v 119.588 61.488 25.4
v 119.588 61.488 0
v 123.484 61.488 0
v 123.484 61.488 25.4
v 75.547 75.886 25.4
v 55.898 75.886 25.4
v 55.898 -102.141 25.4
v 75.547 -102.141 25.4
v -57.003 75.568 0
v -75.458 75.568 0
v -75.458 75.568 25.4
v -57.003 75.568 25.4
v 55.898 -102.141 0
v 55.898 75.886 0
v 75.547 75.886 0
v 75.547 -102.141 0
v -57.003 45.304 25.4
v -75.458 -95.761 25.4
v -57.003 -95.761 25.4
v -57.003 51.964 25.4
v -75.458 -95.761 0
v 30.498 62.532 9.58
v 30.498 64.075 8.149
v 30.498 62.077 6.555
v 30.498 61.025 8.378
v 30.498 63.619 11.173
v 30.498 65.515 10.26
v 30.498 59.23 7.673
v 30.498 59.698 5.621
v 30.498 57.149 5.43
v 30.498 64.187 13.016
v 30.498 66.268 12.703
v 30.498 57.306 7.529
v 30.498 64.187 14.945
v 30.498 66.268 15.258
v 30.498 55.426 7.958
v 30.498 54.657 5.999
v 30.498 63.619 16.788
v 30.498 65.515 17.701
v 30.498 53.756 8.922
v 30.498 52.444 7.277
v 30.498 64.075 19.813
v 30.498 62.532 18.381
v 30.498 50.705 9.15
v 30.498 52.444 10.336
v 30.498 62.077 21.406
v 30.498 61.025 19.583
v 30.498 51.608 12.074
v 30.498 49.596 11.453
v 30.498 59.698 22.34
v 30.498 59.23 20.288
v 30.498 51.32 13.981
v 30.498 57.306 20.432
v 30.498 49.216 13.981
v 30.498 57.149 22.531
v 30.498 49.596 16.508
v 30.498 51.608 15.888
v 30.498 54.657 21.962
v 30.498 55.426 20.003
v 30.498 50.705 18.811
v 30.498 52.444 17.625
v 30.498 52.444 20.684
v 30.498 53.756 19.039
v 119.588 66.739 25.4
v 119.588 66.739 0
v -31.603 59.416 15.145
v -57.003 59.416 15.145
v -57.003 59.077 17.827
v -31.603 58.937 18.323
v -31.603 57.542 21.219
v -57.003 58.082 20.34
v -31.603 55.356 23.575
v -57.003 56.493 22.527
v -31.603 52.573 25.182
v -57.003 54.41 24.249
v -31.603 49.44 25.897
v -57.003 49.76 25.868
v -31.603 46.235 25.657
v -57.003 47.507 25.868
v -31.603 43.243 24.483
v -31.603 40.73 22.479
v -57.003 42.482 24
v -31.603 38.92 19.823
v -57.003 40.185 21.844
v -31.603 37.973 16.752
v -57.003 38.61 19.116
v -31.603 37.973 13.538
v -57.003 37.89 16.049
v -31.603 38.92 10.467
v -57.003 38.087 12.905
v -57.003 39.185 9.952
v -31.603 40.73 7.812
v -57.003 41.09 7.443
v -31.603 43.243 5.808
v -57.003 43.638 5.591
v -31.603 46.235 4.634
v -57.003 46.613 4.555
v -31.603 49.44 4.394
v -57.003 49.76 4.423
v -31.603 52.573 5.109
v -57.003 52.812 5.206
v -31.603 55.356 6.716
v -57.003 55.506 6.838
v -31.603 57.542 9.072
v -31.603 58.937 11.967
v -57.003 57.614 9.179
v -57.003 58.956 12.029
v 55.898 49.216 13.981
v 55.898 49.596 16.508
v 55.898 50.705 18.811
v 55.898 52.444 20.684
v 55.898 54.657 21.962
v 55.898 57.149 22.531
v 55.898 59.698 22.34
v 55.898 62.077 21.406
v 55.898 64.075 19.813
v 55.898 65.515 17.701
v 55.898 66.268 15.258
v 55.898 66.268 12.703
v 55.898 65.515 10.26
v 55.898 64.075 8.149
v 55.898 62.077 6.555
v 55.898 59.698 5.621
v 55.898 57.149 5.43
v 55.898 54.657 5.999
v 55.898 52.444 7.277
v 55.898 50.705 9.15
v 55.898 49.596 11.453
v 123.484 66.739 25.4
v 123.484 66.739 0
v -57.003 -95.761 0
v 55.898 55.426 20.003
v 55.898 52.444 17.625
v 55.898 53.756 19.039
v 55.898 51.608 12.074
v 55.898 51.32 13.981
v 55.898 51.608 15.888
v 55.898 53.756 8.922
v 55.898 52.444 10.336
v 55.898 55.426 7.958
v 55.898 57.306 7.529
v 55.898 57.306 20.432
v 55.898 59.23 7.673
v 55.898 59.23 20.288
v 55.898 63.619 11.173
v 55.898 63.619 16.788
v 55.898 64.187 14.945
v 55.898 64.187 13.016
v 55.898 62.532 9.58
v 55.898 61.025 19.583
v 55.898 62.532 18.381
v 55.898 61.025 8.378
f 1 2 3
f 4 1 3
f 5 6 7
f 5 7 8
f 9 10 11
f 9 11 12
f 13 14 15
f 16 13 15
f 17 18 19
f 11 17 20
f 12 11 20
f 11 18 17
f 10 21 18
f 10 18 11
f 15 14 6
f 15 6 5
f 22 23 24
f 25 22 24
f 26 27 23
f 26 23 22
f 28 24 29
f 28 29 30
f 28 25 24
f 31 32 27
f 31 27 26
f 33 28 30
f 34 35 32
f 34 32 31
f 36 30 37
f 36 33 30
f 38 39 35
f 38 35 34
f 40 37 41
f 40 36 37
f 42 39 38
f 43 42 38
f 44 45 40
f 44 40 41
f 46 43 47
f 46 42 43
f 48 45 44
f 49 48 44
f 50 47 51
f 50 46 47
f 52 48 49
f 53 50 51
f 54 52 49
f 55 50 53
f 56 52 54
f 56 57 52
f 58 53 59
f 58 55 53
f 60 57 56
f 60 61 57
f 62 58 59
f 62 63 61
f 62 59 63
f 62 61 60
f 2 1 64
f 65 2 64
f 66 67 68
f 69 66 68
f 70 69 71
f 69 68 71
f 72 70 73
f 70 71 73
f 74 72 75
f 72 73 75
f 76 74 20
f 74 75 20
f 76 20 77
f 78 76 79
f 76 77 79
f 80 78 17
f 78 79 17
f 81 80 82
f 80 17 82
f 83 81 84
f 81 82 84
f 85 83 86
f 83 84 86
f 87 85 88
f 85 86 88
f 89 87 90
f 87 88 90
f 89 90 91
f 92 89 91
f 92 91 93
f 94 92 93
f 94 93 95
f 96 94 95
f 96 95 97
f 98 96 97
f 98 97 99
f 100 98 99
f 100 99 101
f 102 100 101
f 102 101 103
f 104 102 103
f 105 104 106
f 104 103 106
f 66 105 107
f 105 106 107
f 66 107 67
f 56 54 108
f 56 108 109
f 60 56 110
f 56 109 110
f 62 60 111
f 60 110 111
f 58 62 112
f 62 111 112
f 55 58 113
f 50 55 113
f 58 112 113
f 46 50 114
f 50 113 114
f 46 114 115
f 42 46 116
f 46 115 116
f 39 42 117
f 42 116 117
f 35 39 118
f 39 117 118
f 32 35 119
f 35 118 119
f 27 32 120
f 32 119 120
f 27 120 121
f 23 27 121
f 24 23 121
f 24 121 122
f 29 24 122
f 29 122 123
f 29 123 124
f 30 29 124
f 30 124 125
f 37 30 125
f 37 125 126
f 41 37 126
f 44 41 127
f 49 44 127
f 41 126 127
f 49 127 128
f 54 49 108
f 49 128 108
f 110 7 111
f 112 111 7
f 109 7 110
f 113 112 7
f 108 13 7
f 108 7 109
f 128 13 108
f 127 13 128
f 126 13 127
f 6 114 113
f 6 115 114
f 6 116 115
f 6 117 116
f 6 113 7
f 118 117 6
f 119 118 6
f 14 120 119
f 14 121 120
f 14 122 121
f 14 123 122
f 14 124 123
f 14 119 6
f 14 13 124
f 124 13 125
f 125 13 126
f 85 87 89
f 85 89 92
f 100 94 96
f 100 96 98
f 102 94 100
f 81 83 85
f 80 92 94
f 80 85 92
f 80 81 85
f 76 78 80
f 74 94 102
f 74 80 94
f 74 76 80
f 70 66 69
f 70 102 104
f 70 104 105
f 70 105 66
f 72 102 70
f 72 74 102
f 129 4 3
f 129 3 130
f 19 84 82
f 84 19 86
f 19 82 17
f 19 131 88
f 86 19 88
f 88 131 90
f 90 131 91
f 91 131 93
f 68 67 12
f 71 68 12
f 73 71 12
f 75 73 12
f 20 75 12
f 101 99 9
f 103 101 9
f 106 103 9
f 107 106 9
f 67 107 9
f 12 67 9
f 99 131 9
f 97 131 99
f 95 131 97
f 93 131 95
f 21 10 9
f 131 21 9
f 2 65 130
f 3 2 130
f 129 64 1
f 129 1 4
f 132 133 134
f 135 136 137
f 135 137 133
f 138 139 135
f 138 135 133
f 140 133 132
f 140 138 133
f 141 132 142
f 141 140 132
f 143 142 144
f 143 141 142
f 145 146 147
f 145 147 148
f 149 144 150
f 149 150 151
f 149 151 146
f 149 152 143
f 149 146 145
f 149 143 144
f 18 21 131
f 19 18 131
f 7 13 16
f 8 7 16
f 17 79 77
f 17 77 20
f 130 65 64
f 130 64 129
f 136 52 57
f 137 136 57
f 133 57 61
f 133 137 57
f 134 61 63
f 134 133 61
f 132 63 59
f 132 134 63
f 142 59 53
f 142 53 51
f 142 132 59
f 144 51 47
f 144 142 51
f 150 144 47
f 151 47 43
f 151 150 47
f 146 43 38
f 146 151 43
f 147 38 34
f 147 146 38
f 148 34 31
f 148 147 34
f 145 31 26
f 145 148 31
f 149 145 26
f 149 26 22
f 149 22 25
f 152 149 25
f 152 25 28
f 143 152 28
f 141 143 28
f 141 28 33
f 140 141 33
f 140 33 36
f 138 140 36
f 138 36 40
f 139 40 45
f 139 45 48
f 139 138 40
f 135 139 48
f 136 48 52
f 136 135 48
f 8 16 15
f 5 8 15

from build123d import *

# Parameters (mm, degrees)
F0_W     = 3.8959383965
F0_H     = 5.2510239184
F1_DEPTH = 25.4
F0_W_2   = 19.6490138769
F0_H_2   = 178.0268549919
F0_W_3   = 18.4549018741
F0_H_3   = 171.3291481137
F2_R     = 8.5743267836
F2_R_2   = 6.4696583103
F3_DEPTH = 25.4
F4_R     = 10.7818311597
F5_DEPTH = 25.4


with BuildPart() as f1:
    # F0 (on Top) → F1 (new body)
    with BuildSketch(Plane.XY):
        with Locations((121.5359270573, 64.1133766621)):
            Rectangle(F0_W, F0_H)
    extrude(amount=F1_DEPTH)


with BuildPart() as f1b:
    # F0 (on Top) → F1, piece 2 (new body)
    with BuildSketch(Plane.XY):
        with Locations((65.7225474715, -13.1275802851)):
            Rectangle(F0_W_2, F0_H_2)
    extrude(amount=F1_DEPTH)

    # F2 (on face) → F3 (join)
    with BuildSketch(Plane(origin=(55.8980405331, 0, 0), x_dir=(0, -1, 0), z_dir=(-1, 0, 0))):
        with Locations((-57.7898696065, 13.9805600047)):
            Circle(F2_R)
        with Locations((-57.7898696065, 13.9805600047)):
            Circle(F2_R_2, mode=Mode.SUBTRACT)
    extrude(amount=F3_DEPTH)


with BuildPart() as f1c:
    # F0 (on Top) → F1, piece 3 (new body)
    with BuildSketch(Plane.XY):
        with Locations((-66.2300996482, -10.0965462625)):
            Rectangle(F0_W_3, F0_H_3)
    extrude(amount=F1_DEPTH)

    # F4 (on face) → F5 (join)
    with BuildSketch(Plane.YZ.offset(-57.0026487112)):
        with Locations((48.6339202338, 15.1453325418)):
            Circle(F4_R)
    extrude(amount=F5_DEPTH)


solid = Compound([f1.part, f1b.part, f1c.part])
